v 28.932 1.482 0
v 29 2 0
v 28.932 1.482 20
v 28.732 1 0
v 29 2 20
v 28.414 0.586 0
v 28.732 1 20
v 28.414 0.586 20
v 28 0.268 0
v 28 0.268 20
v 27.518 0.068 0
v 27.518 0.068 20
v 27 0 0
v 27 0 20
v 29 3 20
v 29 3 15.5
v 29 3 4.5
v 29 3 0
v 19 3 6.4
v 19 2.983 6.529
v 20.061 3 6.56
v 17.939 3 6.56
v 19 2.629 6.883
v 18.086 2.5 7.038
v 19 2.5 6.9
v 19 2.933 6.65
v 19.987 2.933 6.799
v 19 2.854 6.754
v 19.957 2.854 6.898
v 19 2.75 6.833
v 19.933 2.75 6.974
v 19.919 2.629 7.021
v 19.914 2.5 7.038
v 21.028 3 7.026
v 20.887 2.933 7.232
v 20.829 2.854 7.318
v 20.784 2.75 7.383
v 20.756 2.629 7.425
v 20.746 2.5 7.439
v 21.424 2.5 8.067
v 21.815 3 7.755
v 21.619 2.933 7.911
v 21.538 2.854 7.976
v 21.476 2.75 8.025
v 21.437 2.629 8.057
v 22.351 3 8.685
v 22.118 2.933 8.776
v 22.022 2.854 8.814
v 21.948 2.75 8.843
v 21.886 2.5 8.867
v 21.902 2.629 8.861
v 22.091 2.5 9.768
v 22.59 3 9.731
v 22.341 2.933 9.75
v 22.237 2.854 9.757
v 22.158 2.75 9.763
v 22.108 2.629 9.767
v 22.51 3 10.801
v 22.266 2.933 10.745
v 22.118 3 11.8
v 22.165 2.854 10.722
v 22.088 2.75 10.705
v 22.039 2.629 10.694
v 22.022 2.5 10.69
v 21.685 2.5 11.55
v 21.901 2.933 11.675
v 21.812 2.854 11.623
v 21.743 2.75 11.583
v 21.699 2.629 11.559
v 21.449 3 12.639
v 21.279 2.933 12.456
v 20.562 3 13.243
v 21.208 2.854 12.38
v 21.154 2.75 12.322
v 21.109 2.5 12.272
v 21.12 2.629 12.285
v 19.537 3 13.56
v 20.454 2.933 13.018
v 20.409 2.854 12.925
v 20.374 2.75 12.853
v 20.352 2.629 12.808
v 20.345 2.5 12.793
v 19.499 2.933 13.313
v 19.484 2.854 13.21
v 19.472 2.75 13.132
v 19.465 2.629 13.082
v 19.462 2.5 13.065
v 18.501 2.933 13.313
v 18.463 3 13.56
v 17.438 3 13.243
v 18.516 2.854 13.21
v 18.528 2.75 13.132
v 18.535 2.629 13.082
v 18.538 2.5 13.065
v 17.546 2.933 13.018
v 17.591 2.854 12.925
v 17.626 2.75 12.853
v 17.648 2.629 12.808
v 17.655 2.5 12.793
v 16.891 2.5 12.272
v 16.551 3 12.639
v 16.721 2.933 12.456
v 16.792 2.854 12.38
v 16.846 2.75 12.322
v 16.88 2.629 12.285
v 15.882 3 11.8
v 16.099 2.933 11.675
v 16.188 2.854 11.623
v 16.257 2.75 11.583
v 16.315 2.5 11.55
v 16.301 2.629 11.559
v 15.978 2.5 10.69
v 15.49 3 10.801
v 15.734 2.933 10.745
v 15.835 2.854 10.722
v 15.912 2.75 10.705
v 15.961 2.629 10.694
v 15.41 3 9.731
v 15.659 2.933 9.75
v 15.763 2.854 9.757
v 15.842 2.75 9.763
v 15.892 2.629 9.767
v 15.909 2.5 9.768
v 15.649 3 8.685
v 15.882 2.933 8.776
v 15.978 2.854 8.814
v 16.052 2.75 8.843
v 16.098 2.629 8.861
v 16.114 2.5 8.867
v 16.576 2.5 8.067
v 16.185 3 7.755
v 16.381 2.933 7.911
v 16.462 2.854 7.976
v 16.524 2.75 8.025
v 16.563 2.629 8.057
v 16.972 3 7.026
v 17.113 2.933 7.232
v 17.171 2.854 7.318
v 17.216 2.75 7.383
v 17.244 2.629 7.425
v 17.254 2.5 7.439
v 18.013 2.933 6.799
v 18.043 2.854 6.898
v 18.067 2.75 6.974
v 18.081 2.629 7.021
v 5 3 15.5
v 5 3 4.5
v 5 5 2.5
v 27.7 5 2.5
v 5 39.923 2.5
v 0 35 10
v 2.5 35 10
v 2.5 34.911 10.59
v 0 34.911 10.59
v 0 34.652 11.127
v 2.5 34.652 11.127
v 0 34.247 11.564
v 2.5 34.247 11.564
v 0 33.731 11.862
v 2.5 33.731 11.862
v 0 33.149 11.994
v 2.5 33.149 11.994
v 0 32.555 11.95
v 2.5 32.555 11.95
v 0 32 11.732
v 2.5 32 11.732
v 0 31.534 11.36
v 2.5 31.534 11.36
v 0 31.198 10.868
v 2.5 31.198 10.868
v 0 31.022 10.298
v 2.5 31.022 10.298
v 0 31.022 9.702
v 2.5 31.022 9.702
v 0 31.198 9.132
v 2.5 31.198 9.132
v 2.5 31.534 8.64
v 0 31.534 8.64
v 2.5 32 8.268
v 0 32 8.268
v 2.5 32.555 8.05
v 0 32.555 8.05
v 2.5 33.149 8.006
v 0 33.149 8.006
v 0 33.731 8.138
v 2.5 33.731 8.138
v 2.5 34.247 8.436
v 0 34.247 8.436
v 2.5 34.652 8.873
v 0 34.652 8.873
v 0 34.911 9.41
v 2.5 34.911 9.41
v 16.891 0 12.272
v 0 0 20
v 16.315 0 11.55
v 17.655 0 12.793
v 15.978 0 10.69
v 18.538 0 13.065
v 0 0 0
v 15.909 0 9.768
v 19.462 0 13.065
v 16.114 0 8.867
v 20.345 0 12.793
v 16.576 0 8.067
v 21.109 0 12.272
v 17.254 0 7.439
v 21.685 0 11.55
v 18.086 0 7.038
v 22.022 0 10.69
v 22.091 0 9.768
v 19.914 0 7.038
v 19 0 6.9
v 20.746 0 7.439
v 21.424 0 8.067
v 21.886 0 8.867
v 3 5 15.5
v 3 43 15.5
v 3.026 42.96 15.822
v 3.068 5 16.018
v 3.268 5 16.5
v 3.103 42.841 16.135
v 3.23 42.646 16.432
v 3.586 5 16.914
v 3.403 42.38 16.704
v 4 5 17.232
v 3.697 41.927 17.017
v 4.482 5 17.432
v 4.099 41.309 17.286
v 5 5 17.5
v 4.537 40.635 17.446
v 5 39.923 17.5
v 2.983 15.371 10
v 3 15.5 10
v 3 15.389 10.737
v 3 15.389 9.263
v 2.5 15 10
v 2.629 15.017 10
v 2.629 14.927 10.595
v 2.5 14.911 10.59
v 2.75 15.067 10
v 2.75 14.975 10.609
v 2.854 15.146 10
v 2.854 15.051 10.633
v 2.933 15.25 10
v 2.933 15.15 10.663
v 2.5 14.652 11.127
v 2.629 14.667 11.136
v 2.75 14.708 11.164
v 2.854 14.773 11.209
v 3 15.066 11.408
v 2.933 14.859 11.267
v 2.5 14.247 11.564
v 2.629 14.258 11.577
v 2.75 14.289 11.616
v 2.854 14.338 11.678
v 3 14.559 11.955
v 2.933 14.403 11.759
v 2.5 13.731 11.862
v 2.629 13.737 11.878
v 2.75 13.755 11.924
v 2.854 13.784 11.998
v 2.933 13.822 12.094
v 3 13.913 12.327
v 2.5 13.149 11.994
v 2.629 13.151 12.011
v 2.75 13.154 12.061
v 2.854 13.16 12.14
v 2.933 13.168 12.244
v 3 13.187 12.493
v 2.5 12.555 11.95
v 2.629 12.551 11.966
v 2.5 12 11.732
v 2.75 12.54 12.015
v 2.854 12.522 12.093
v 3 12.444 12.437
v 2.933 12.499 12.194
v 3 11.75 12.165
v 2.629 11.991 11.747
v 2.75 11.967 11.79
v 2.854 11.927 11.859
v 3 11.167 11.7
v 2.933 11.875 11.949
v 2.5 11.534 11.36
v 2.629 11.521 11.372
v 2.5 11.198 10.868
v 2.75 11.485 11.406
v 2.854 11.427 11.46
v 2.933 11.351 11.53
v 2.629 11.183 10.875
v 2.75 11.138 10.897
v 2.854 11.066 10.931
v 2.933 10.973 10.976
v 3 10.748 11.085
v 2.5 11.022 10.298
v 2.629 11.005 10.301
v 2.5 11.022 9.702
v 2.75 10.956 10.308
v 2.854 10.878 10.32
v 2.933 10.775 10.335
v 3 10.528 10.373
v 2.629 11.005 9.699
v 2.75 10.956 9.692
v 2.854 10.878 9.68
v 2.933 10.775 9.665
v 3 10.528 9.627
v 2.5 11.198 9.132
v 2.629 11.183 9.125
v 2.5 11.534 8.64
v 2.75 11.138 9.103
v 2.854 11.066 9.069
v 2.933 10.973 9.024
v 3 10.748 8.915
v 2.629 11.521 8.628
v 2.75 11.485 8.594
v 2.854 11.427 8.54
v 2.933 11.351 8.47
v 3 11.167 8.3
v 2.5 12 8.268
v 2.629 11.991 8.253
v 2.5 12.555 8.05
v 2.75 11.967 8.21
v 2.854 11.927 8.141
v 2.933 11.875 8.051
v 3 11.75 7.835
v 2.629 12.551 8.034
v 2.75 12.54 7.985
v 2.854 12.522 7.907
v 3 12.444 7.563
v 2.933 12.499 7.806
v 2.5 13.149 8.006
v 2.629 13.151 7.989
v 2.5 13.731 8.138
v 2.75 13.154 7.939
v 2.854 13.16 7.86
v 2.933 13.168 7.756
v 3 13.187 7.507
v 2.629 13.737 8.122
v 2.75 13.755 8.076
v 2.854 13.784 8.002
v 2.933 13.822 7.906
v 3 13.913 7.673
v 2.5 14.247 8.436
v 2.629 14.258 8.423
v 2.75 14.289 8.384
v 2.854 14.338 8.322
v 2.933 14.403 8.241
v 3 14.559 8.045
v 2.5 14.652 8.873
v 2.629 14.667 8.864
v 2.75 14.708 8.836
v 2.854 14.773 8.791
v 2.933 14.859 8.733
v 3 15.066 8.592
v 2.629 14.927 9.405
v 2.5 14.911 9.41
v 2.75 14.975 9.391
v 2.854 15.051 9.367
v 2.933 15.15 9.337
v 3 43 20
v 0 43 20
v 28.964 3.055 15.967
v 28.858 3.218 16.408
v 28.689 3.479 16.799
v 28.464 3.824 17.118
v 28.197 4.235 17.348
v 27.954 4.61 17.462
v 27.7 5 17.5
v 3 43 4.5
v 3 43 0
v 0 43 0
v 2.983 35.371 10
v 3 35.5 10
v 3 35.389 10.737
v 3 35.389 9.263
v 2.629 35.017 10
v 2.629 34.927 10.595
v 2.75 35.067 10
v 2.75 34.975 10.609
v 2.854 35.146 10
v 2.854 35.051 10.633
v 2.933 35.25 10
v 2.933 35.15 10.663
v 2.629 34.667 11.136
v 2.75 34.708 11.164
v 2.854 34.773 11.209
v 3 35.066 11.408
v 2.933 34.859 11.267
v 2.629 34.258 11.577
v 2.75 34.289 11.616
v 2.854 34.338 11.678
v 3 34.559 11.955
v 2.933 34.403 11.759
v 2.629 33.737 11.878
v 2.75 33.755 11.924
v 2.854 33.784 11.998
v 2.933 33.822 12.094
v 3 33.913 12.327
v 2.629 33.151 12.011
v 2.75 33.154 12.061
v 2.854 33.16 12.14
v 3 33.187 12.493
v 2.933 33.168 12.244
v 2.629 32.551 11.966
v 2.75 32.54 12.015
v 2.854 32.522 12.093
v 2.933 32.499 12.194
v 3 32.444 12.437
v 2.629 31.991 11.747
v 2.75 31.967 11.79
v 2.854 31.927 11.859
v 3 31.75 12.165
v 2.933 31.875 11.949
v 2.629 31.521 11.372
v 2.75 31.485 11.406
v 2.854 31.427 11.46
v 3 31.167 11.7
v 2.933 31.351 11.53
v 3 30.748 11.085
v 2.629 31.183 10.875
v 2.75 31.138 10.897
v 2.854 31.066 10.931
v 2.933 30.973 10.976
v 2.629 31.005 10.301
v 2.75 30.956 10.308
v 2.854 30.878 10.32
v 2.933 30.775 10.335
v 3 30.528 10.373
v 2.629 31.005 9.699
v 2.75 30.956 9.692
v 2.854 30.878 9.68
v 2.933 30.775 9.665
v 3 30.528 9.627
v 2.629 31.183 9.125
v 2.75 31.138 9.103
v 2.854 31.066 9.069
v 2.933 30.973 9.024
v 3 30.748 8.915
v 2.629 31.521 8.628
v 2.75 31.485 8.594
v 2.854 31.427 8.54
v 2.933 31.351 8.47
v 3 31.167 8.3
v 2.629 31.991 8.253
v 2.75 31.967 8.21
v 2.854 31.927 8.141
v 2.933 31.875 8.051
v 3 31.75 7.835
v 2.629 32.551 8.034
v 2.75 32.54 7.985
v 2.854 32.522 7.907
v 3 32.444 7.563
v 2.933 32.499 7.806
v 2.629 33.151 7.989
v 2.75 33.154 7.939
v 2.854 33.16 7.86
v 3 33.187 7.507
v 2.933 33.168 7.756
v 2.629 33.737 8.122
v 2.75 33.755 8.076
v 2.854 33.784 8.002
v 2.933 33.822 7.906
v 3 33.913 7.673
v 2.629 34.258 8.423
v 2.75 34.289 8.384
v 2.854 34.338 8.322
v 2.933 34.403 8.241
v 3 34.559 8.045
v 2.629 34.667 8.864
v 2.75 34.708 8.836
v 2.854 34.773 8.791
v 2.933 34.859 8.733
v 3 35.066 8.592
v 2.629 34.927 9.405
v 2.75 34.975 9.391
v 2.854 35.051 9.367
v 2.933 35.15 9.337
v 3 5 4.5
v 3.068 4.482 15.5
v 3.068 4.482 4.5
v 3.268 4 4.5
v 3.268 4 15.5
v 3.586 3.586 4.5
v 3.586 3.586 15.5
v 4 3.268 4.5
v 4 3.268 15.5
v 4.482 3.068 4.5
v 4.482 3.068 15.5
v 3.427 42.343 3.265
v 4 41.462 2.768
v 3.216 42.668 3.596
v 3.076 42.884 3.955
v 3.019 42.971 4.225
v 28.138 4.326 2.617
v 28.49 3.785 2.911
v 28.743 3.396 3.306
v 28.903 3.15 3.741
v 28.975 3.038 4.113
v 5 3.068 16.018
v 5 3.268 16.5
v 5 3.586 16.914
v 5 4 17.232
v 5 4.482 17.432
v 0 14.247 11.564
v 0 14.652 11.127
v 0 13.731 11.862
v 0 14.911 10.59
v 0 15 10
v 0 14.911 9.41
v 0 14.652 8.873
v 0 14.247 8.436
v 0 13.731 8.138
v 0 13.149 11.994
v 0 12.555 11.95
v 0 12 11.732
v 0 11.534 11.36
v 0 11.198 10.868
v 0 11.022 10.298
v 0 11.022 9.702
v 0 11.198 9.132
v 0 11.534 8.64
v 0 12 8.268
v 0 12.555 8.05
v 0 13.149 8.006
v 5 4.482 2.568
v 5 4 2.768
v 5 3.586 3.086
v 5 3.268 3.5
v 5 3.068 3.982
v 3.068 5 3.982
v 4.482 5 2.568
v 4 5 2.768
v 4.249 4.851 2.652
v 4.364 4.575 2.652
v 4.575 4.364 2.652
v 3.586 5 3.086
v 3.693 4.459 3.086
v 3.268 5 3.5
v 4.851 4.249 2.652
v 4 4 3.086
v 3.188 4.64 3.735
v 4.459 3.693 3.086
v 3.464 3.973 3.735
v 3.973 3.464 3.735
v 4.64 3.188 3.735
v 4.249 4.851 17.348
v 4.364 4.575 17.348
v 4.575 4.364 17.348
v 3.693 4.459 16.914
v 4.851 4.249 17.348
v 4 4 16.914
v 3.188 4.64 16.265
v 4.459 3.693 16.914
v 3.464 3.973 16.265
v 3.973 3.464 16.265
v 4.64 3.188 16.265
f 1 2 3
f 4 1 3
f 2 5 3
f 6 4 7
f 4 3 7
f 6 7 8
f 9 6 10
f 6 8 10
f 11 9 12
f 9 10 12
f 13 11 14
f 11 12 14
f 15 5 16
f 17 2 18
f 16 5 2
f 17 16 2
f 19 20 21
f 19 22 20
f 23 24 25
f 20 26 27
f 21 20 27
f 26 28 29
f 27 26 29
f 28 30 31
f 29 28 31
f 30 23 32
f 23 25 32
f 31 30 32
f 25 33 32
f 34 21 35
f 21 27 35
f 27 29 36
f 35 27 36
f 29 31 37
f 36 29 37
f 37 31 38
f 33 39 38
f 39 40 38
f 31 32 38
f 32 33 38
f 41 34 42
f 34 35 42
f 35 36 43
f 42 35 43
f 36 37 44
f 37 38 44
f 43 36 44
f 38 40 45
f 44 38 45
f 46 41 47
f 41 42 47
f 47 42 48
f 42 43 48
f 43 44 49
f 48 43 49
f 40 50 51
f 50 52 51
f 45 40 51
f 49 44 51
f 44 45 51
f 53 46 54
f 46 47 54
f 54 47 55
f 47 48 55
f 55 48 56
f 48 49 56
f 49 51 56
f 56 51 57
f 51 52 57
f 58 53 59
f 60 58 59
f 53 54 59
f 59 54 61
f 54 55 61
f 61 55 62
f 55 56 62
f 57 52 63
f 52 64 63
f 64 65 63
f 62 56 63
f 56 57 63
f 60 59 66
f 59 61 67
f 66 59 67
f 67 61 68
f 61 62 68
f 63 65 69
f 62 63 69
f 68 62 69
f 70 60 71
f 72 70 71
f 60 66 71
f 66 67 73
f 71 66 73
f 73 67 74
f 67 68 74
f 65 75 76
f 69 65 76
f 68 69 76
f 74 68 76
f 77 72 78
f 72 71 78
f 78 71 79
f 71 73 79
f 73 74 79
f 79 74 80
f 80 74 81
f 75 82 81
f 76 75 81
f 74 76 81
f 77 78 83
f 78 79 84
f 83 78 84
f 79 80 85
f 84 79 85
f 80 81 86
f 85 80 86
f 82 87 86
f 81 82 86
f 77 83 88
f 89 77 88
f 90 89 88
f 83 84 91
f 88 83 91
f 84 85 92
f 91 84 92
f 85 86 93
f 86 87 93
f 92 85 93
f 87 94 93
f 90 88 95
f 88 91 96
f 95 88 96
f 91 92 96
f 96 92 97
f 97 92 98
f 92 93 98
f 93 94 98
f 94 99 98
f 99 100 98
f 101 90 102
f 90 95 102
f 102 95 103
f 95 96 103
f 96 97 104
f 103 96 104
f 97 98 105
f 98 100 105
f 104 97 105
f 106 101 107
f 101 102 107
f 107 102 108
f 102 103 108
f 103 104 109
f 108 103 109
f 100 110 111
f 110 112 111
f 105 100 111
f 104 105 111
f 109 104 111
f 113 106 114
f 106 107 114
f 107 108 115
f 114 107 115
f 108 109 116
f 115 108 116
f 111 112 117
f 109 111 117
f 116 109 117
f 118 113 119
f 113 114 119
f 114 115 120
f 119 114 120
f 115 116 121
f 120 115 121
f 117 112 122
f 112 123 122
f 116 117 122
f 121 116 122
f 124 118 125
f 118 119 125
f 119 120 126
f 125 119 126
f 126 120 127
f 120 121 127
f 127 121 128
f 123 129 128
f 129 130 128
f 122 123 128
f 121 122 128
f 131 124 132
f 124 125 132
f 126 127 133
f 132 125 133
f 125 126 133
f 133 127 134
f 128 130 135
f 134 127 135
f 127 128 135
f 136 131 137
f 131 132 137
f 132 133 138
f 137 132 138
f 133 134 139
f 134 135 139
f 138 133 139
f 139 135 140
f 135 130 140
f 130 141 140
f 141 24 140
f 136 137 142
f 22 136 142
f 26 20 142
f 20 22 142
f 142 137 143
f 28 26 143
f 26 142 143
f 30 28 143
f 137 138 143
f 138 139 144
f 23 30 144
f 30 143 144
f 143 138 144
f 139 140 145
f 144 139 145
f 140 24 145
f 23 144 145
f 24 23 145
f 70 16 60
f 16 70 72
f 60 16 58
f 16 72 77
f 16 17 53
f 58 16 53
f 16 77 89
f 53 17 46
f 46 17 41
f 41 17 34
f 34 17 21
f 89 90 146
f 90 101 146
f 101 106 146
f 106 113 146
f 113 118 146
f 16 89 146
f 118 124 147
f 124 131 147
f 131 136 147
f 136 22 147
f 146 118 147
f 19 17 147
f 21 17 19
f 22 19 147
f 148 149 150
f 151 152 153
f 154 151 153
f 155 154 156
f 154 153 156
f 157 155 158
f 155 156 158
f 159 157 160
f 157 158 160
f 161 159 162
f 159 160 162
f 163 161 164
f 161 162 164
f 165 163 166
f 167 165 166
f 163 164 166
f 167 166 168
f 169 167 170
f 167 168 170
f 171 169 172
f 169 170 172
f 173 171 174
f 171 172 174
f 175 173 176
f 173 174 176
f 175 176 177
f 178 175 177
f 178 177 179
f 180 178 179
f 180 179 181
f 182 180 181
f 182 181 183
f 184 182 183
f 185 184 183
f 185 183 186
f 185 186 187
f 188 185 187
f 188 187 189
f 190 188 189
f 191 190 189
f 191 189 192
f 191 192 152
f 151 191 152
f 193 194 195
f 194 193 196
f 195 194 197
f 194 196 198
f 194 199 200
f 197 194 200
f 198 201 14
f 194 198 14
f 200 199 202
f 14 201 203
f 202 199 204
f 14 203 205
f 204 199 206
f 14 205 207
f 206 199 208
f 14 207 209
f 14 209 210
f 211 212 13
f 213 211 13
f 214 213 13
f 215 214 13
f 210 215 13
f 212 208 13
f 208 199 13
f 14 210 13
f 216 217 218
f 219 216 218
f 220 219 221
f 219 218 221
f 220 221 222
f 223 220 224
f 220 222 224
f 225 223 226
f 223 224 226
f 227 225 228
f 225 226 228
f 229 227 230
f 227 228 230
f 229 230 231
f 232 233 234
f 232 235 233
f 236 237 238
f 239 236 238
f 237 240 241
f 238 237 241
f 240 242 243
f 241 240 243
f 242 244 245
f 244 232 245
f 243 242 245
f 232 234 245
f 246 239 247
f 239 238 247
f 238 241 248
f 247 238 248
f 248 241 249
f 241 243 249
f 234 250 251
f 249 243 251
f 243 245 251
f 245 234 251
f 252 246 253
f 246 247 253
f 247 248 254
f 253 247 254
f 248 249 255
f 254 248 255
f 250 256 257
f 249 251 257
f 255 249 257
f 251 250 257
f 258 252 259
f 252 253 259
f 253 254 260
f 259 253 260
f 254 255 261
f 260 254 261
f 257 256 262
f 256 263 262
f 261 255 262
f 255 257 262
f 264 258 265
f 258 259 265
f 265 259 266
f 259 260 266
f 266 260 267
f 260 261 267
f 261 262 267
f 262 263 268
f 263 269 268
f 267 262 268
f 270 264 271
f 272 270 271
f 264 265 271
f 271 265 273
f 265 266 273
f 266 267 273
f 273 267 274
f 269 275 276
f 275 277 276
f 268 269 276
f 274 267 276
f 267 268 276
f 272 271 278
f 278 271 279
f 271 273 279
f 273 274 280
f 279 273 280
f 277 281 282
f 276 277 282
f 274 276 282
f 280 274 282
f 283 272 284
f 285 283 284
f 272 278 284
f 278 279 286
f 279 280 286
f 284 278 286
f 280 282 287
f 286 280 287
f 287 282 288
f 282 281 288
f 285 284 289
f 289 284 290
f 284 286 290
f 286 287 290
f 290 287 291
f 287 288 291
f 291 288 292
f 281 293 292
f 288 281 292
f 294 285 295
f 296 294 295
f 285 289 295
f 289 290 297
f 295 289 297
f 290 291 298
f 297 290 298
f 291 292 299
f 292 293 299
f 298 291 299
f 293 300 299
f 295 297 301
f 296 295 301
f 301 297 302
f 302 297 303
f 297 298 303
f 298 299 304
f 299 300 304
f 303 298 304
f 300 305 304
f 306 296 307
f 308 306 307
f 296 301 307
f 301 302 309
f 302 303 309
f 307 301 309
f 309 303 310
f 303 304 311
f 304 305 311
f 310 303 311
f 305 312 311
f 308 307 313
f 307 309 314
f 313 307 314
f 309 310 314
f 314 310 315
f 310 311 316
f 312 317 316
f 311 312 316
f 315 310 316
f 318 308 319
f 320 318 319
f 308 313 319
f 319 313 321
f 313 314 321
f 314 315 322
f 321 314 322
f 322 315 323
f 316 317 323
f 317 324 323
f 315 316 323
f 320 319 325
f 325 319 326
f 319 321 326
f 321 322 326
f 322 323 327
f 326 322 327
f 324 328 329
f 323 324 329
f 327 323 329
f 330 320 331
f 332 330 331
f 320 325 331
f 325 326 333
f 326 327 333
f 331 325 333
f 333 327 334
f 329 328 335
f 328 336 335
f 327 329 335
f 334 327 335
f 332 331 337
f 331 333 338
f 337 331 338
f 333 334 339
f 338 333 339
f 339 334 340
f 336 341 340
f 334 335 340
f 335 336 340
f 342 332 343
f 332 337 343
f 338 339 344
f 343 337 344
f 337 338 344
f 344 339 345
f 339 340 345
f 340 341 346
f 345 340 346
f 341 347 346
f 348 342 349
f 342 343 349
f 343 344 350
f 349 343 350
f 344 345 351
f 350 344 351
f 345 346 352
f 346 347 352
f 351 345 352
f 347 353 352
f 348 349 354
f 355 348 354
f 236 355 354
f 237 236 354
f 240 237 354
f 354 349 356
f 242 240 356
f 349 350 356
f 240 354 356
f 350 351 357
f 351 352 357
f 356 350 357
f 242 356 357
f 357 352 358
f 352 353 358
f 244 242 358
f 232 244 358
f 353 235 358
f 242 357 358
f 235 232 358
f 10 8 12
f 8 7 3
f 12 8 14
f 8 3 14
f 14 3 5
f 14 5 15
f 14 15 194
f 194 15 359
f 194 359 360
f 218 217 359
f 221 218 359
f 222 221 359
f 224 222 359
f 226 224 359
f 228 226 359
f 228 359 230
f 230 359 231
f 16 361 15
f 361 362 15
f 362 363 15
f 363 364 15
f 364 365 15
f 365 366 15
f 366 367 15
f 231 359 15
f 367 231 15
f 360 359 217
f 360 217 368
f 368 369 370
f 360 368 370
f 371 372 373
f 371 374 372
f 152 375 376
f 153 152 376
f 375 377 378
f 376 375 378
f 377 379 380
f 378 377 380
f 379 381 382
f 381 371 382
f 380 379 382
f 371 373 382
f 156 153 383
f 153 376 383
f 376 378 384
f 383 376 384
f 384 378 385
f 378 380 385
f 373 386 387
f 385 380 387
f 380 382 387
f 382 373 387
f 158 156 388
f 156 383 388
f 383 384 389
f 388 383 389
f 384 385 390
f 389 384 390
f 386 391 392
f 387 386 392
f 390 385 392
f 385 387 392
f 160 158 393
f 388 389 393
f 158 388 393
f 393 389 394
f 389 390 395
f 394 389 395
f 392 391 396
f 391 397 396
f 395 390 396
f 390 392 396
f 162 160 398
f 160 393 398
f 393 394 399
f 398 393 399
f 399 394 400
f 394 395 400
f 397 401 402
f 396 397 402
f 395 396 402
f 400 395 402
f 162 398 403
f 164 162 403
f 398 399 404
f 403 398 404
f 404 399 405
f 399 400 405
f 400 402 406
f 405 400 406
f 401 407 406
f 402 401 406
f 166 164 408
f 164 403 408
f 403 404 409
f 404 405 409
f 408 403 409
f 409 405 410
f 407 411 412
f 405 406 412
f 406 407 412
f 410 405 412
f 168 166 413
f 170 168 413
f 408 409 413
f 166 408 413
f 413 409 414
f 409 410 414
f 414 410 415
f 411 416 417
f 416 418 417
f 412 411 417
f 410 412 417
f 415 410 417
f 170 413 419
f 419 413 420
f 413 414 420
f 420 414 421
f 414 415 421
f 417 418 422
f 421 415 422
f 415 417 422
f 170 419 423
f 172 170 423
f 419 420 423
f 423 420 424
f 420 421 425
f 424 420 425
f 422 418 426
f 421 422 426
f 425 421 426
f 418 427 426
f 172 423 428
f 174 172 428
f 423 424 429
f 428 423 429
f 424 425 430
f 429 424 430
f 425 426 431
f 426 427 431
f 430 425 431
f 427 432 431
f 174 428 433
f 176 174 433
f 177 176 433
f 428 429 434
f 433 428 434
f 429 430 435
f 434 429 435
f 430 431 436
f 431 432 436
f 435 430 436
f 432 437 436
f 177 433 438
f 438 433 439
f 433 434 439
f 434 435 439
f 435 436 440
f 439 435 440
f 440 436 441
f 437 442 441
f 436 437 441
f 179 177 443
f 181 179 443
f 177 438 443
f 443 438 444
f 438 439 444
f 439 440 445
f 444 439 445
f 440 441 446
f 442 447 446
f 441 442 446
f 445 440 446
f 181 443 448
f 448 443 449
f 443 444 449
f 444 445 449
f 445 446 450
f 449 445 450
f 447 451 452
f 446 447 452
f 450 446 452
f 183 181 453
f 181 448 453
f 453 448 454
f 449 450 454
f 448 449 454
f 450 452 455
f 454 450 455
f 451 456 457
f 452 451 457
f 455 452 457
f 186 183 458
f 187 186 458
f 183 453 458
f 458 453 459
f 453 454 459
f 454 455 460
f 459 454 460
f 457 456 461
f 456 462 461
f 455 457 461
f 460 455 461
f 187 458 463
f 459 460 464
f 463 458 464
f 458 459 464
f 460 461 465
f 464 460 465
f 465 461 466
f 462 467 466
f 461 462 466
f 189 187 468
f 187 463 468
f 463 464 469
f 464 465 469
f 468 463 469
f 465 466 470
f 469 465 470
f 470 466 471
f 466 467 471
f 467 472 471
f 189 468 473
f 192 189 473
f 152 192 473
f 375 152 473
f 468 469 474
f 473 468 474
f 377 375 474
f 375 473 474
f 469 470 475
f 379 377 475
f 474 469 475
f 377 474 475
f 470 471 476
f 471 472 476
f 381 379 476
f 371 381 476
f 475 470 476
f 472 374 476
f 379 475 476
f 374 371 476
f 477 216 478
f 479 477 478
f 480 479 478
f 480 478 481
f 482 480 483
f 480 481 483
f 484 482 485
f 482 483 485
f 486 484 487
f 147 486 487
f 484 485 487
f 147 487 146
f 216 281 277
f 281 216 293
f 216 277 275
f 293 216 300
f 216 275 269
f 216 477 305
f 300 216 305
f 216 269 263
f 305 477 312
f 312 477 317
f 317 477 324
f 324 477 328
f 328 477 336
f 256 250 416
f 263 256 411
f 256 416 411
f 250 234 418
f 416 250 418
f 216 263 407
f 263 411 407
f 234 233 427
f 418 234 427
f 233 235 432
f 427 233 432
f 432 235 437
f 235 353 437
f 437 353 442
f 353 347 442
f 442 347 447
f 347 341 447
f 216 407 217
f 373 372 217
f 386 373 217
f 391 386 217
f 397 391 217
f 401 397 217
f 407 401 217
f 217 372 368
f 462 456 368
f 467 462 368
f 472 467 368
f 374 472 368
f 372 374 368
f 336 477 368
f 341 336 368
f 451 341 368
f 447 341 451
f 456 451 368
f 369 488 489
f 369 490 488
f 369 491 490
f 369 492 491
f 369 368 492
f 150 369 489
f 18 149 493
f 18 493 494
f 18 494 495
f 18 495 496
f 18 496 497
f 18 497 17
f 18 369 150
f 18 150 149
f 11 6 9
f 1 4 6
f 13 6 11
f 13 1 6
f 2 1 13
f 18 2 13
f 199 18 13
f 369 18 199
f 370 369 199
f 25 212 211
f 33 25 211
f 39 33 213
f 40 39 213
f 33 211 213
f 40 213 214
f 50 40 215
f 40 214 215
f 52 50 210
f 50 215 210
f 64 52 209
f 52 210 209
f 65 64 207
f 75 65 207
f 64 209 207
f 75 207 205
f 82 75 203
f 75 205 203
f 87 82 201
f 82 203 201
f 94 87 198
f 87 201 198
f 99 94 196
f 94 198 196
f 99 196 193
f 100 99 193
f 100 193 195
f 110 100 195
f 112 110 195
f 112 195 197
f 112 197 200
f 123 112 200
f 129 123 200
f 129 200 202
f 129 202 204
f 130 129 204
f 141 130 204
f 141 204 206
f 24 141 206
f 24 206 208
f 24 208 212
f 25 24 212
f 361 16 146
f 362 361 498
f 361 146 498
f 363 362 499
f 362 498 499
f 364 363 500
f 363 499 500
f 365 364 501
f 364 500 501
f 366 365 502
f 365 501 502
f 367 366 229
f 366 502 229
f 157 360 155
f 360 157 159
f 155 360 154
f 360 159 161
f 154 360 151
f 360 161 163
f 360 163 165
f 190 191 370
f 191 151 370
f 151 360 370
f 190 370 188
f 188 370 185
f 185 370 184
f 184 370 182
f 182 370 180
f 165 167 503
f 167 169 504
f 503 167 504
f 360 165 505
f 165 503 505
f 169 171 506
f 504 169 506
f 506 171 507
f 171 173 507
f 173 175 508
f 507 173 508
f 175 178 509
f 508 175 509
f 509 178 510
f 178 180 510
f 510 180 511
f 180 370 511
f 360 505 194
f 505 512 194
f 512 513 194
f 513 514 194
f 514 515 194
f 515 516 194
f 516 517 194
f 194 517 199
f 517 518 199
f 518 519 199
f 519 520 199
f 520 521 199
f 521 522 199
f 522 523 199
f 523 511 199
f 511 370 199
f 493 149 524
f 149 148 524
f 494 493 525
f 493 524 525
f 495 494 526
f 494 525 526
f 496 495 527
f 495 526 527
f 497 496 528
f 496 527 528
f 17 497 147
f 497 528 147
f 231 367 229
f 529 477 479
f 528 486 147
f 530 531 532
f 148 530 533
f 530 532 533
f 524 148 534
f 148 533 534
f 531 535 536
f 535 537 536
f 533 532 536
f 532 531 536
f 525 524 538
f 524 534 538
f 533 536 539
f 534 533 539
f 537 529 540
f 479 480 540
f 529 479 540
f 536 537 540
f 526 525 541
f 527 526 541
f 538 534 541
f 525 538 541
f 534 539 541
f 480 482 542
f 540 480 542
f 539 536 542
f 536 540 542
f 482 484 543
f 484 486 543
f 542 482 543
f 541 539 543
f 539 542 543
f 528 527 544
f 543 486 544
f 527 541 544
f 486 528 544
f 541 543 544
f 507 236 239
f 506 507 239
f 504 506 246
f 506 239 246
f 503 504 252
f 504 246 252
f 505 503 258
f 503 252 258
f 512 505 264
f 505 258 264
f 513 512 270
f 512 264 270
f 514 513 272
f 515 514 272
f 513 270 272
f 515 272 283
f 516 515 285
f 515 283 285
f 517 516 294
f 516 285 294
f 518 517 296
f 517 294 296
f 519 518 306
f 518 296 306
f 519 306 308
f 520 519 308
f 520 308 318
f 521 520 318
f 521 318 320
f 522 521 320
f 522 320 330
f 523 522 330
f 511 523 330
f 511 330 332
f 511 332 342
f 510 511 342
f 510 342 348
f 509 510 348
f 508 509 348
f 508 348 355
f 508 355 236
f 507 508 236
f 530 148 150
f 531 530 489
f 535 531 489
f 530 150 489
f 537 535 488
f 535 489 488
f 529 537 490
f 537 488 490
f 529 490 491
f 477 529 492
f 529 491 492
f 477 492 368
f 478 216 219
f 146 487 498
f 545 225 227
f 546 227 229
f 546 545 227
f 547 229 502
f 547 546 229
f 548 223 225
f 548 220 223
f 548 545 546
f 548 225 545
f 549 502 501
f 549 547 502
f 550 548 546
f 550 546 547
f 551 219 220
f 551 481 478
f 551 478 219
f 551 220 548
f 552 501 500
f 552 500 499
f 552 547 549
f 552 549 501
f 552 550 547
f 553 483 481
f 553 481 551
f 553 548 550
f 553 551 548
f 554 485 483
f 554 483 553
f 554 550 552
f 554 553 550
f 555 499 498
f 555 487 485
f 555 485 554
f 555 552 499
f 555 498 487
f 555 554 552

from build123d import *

# Parameters (mm, degrees)
BOSS_EXTRUDE1_DEPTH = 20
BOSS_EXTRUDE2_DEPTH = 2.5
BOSS_EXTRUDE3_DEPTH = 2.5
SKETCH4_R           = 2
CUT_EXTRUDE1_DEPTH  = 55.083269132
SKETCH6_R           = 3.1
CUT_EXTRUDE2_DEPTH  = 56.587768439
FILLET1_R           = 2
FILLET2_R           = 0.5


with BuildPart() as part:
    # Sketch1 → Boss-Extrude1 (new body)
    with BuildSketch(Plane.XY):
        Polygon((0, 43), (0, 0), (29, 0), (29, 3), (3, 3), (3, 43), align=None)
    extrude(amount=BOSS_EXTRUDE1_DEPTH)

    # Sketch2 → Boss-Extrude2 (add)
    with BuildSketch(Plane.XY.offset(20)):
        Polygon((3, 43), (29, 3), (3, 3), align=None)
    extrude(amount=-BOSS_EXTRUDE2_DEPTH)

    # Sketch3 → Boss-Extrude3 (add)
    with BuildSketch(Plane(origin=(0, 0, 0), x_dir=(-1, 0, 0), z_dir=(0, 0, -1))):
        Polygon((-3, 43), (-29, 3), (-3, 3), align=None)
    extrude(amount=-BOSS_EXTRUDE3_DEPTH)

    # Sketch4 → Cut-Extrude1 (cut, through all)
    with BuildSketch(Plane(origin=(3, 0, 0), x_dir=(0, 0, -1), z_dir=(1, 0, 0))):
        with Locations(Location((-10, 33, 0), (0, 0, 90))):
            Circle(SKETCH4_R)
        with Locations(Location((-10, 13, 0), (0, 0, 90))):
            Circle(SKETCH4_R)
    extrude(amount=-CUT_EXTRUDE1_DEPTH, mode=Mode.SUBTRACT)

    # Sketch6 → Cut-Extrude2 (cut, through all)
    with BuildSketch(Plane.XZ):
        with Locations(Location((19, 10, 0), (0, 0, 270))):
            Circle(SKETCH6_R)
    extrude(amount=-CUT_EXTRUDE2_DEPTH, mode=Mode.SUBTRACT)

    # Fillet1
    fillet1_edges = [part.edges().sort_by_distance(p)[0] for p in [
        (29, 0, 10),
        (3, 3, 10),
        (3, 23, 17.5),
        (16, 3, 17.5),
        (3, 23, 2.5),
        (16, 3, 2.5),
    ]]
    fillet(fillet1_edges, radius=FILLET1_R)

    # Fillet2
    fillet2_edges = [part.edges().sort_by_distance(p)[0] for p in [
        (3, 31, 10),
        (3, 11, 10),
        (19, 3, 13.1),
    ]]
    fillet(fillet2_edges, radius=FILLET2_R)


solid = part.part
